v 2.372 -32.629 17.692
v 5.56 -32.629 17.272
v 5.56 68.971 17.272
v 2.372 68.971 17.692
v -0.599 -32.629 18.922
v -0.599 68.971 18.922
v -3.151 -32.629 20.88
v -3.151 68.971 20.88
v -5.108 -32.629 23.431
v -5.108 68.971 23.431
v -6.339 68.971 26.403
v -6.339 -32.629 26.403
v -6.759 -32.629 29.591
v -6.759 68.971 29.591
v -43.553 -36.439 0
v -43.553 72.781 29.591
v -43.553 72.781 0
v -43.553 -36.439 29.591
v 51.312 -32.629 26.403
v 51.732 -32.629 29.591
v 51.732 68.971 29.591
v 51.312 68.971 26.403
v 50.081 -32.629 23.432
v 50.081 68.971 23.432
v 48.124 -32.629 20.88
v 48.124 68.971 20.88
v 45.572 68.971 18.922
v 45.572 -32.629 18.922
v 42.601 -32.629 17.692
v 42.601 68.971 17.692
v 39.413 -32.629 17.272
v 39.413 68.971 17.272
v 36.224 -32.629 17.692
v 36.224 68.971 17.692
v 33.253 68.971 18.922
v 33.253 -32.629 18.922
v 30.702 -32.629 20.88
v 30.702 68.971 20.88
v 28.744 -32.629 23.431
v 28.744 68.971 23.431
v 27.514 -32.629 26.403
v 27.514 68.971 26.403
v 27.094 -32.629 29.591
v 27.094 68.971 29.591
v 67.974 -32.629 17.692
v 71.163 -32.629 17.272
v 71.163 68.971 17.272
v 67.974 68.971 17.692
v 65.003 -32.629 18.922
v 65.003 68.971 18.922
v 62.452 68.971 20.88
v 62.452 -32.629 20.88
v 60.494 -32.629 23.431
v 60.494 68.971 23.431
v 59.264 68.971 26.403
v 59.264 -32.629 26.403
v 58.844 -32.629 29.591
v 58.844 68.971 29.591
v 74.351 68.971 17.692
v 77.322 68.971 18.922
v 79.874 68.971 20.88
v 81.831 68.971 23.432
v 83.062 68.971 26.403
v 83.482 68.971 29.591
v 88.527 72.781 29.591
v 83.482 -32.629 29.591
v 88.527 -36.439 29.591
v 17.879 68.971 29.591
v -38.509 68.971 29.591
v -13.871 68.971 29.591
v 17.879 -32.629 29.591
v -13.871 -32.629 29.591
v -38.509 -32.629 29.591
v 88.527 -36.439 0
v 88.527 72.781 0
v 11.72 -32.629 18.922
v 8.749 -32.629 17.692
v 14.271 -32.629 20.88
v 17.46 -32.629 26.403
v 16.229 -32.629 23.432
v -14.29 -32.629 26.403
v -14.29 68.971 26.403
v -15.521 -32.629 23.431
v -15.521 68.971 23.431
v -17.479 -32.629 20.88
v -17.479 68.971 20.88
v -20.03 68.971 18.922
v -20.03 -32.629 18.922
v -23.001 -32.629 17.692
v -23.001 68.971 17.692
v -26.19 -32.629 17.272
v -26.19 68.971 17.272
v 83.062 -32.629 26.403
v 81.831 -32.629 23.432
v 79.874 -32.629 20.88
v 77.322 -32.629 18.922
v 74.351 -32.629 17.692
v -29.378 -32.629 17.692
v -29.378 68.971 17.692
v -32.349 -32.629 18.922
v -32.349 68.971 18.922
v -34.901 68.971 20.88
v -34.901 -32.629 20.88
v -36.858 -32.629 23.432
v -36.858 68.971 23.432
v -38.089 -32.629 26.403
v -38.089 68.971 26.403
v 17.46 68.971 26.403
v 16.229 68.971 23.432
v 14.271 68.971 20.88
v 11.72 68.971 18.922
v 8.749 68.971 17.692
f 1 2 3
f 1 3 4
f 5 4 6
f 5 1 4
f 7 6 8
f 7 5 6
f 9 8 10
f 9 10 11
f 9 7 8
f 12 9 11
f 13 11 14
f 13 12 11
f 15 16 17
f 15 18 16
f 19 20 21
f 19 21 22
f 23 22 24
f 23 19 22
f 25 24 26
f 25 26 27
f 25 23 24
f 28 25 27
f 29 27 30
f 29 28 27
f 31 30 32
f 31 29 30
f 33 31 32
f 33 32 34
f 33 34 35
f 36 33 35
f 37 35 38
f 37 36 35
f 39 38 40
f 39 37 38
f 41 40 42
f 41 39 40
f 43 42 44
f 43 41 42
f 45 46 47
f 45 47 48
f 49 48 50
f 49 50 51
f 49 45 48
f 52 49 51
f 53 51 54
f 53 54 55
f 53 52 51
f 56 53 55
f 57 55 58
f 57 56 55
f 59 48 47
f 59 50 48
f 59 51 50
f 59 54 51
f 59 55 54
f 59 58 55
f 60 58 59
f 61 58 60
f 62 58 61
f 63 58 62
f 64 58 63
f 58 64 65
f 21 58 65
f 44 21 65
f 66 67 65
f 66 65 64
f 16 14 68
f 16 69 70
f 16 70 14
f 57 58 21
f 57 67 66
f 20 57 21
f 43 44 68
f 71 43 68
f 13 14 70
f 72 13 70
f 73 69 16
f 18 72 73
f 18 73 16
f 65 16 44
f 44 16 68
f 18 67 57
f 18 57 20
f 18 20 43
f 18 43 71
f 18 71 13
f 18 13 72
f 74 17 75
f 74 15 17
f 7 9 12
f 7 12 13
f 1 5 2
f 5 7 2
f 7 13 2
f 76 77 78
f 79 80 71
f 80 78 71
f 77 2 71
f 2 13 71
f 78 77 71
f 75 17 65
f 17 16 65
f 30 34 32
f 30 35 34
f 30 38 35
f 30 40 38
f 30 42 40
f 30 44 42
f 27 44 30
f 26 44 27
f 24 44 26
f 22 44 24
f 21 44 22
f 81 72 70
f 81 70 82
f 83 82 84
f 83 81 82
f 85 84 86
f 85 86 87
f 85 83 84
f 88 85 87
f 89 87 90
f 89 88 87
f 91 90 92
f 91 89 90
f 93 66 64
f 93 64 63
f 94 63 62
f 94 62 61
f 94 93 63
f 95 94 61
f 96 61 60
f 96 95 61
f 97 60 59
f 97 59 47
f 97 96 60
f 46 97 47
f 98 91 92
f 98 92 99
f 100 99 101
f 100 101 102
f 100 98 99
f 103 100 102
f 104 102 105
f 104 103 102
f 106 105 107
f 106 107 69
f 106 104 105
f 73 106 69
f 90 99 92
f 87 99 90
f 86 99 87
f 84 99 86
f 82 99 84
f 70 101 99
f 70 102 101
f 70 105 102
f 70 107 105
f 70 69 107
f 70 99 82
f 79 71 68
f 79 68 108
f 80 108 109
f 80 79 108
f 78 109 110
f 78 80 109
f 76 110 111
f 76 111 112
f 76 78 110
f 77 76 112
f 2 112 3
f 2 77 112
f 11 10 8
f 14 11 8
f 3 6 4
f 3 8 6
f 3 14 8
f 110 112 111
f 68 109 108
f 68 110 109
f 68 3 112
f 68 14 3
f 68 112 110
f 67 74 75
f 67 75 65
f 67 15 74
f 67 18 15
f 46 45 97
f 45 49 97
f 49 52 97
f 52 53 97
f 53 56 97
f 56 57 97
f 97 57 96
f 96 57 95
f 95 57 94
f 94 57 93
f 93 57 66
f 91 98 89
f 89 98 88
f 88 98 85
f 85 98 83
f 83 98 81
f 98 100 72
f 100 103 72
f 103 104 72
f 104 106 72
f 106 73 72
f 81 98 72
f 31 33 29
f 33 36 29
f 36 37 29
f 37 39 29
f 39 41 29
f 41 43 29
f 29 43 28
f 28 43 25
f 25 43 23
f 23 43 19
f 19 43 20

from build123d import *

# Parameters (mm, degrees)
F0_W     = 132.08
F0_H     = 101.6
F1_DEPTH = 17.272
F3_DEPTH = 101.6
F6_DEPTH = 3.81


with BuildPart() as f1:
    # F0 (on Top) → F1 (new body)
    with BuildSketch(Plane.XY):
        with Locations((22.4865525961, 18.1711361257)):
            Rectangle(F0_W, F0_H)
    extrude(amount=F1_DEPTH)

    # F2 (on face) → F3 (join, through all)
    with BuildSketch(Plane.XZ.offset(32.6288638743)):
        with BuildLine():
            Line((-6.7586990196, 29.591), (-13.8706990196, 29.591))
            ThreePointArc((-13.8706990196, 29.591), (-17.4788505821, 20.8801515626), (-26.1896990196, 17.272))
            Line((-26.1896990196, 17.272), (5.560301017, 17.272))
            ThreePointArc((5.560301017, 17.272), (-3.1505474441, 20.8801515496), (-6.7586990196, 29.591))
        make_face()
        with BuildLine():
            ThreePointArc((-26.1896990196, 17.272), (-34.900547457, 20.8801515626), (-38.5086990196, 29.591))
            Line((-38.5086990196, 29.591), (-43.5534474039, 29.591))
            Line((-43.5534474039, 29.591), (-43.5534474039, 17.272))
            Line((-43.5534474039, 17.272), (-26.1896990196, 17.272))
        make_face()
        with BuildLine():
            ThreePointArc((17.8793009804, 29.591), (14.2711494308, 20.8801515755), (5.560301017, 17.272))
            Line((5.560301017, 17.272), (39.4128042118, 17.272))
            ThreePointArc((39.4128042118, 17.272), (30.7019557743, 20.8801515626), (27.0938042118, 29.591))
            Line((27.0938042118, 29.591), (17.8793009804, 29.591))
        make_face()
        with BuildLine():
            ThreePointArc((51.7318042118, 29.591), (48.1236526492, 20.8801515626), (39.4128042118, 17.272))
            Line((39.4128042118, 17.272), (71.1628042118, 17.272))
            ThreePointArc((71.1628042118, 17.272), (62.4519557743, 20.8801515626), (58.8438042118, 29.591))
            Line((58.8438042118, 29.591), (51.7318042118, 29.591))
        make_face()
        with BuildLine():
            ThreePointArc((83.4818042118, 29.591), (79.8736526492, 20.8801515626), (71.1628042118, 17.272))
            Line((71.1628042118, 17.272), (88.5265525961, 17.272))
            Line((88.5265525961, 17.272), (88.5265525961, 29.591))
            Line((88.5265525961, 29.591), (83.4818042118, 29.591))
        make_face()
    extrude(amount=-F3_DEPTH)

    # F5 (on face) → F6 (join)
    with BuildSketch(Plane.XZ.offset(32.6288638743)):
        with BuildLine():
            Line((-43.5534474039, 0), (88.5265525961, 0))
            Line((88.5265525961, 0), (88.5265525961, 29.591))
            Line((88.5265525961, 29.591), (83.4818042118, 29.591))
            ThreePointArc((83.4818042118, 29.591), (71.1628042118, 17.272), (58.8438042118, 29.591))
            Line((58.8438042118, 29.591), (51.7318042118, 29.591))
            ThreePointArc((51.7318042118, 29.591), (39.4128042118, 17.272), (27.0938042118, 29.591))
            Line((27.0938042118, 29.591), (17.8793009804, 29.591))
            ThreePointArc((17.8793009804, 29.591), (5.5603009804, 17.272), (-6.7586990196, 29.591))
            Line((-6.7586990196, 29.591), (-13.8706990196, 29.591))
            ThreePointArc((-13.8706990196, 29.591), (-26.1896990196, 17.272), (-38.5086990196, 29.591))
            Line((-38.5086990196, 29.591), (-43.5534474039, 29.591))
            Line((-43.5534474039, 29.591), (-43.5534474039, 0))
        make_face()
        with BuildLine():
            ThreePointArc((58.8438042118, 29.591), (71.1628042118, 17.272), (83.4818042118, 29.591))
            Line((83.4818042118, 29.591), (58.8438042118, 29.591))
        make_face()
        with BuildLine():
            Line((-13.8706990196, 29.591), (-38.5086990196, 29.591))
            ThreePointArc((-38.5086990196, 29.591), (-26.1896990196, 17.272), (-13.8706990196, 29.591))
        make_face()
        with BuildLine():
            ThreePointArc((27.0938042118, 29.591), (39.4128042118, 17.272), (51.7318042118, 29.591))
            Line((51.7318042118, 29.591), (27.0938042118, 29.591))
        make_face()
        with BuildLine():
            Line((17.8793009804, 29.591), (-6.7586990196, 29.591))
            ThreePointArc((-6.7586990196, 29.591), (5.5603009804, 17.272), (17.8793009804, 29.591))
        make_face()
    extrude(amount=F6_DEPTH)

    # F7: F1 across plane


with BuildPart() as f1_1:
    add(f1.part)
    add(f1.part.mirror(Plane(origin=(22.4865525961, 18.1711361257, 11.7082126405), x_dir=(1, 0, 0), z_dir=(0, -1, 0))))


solid = f1_1.part
